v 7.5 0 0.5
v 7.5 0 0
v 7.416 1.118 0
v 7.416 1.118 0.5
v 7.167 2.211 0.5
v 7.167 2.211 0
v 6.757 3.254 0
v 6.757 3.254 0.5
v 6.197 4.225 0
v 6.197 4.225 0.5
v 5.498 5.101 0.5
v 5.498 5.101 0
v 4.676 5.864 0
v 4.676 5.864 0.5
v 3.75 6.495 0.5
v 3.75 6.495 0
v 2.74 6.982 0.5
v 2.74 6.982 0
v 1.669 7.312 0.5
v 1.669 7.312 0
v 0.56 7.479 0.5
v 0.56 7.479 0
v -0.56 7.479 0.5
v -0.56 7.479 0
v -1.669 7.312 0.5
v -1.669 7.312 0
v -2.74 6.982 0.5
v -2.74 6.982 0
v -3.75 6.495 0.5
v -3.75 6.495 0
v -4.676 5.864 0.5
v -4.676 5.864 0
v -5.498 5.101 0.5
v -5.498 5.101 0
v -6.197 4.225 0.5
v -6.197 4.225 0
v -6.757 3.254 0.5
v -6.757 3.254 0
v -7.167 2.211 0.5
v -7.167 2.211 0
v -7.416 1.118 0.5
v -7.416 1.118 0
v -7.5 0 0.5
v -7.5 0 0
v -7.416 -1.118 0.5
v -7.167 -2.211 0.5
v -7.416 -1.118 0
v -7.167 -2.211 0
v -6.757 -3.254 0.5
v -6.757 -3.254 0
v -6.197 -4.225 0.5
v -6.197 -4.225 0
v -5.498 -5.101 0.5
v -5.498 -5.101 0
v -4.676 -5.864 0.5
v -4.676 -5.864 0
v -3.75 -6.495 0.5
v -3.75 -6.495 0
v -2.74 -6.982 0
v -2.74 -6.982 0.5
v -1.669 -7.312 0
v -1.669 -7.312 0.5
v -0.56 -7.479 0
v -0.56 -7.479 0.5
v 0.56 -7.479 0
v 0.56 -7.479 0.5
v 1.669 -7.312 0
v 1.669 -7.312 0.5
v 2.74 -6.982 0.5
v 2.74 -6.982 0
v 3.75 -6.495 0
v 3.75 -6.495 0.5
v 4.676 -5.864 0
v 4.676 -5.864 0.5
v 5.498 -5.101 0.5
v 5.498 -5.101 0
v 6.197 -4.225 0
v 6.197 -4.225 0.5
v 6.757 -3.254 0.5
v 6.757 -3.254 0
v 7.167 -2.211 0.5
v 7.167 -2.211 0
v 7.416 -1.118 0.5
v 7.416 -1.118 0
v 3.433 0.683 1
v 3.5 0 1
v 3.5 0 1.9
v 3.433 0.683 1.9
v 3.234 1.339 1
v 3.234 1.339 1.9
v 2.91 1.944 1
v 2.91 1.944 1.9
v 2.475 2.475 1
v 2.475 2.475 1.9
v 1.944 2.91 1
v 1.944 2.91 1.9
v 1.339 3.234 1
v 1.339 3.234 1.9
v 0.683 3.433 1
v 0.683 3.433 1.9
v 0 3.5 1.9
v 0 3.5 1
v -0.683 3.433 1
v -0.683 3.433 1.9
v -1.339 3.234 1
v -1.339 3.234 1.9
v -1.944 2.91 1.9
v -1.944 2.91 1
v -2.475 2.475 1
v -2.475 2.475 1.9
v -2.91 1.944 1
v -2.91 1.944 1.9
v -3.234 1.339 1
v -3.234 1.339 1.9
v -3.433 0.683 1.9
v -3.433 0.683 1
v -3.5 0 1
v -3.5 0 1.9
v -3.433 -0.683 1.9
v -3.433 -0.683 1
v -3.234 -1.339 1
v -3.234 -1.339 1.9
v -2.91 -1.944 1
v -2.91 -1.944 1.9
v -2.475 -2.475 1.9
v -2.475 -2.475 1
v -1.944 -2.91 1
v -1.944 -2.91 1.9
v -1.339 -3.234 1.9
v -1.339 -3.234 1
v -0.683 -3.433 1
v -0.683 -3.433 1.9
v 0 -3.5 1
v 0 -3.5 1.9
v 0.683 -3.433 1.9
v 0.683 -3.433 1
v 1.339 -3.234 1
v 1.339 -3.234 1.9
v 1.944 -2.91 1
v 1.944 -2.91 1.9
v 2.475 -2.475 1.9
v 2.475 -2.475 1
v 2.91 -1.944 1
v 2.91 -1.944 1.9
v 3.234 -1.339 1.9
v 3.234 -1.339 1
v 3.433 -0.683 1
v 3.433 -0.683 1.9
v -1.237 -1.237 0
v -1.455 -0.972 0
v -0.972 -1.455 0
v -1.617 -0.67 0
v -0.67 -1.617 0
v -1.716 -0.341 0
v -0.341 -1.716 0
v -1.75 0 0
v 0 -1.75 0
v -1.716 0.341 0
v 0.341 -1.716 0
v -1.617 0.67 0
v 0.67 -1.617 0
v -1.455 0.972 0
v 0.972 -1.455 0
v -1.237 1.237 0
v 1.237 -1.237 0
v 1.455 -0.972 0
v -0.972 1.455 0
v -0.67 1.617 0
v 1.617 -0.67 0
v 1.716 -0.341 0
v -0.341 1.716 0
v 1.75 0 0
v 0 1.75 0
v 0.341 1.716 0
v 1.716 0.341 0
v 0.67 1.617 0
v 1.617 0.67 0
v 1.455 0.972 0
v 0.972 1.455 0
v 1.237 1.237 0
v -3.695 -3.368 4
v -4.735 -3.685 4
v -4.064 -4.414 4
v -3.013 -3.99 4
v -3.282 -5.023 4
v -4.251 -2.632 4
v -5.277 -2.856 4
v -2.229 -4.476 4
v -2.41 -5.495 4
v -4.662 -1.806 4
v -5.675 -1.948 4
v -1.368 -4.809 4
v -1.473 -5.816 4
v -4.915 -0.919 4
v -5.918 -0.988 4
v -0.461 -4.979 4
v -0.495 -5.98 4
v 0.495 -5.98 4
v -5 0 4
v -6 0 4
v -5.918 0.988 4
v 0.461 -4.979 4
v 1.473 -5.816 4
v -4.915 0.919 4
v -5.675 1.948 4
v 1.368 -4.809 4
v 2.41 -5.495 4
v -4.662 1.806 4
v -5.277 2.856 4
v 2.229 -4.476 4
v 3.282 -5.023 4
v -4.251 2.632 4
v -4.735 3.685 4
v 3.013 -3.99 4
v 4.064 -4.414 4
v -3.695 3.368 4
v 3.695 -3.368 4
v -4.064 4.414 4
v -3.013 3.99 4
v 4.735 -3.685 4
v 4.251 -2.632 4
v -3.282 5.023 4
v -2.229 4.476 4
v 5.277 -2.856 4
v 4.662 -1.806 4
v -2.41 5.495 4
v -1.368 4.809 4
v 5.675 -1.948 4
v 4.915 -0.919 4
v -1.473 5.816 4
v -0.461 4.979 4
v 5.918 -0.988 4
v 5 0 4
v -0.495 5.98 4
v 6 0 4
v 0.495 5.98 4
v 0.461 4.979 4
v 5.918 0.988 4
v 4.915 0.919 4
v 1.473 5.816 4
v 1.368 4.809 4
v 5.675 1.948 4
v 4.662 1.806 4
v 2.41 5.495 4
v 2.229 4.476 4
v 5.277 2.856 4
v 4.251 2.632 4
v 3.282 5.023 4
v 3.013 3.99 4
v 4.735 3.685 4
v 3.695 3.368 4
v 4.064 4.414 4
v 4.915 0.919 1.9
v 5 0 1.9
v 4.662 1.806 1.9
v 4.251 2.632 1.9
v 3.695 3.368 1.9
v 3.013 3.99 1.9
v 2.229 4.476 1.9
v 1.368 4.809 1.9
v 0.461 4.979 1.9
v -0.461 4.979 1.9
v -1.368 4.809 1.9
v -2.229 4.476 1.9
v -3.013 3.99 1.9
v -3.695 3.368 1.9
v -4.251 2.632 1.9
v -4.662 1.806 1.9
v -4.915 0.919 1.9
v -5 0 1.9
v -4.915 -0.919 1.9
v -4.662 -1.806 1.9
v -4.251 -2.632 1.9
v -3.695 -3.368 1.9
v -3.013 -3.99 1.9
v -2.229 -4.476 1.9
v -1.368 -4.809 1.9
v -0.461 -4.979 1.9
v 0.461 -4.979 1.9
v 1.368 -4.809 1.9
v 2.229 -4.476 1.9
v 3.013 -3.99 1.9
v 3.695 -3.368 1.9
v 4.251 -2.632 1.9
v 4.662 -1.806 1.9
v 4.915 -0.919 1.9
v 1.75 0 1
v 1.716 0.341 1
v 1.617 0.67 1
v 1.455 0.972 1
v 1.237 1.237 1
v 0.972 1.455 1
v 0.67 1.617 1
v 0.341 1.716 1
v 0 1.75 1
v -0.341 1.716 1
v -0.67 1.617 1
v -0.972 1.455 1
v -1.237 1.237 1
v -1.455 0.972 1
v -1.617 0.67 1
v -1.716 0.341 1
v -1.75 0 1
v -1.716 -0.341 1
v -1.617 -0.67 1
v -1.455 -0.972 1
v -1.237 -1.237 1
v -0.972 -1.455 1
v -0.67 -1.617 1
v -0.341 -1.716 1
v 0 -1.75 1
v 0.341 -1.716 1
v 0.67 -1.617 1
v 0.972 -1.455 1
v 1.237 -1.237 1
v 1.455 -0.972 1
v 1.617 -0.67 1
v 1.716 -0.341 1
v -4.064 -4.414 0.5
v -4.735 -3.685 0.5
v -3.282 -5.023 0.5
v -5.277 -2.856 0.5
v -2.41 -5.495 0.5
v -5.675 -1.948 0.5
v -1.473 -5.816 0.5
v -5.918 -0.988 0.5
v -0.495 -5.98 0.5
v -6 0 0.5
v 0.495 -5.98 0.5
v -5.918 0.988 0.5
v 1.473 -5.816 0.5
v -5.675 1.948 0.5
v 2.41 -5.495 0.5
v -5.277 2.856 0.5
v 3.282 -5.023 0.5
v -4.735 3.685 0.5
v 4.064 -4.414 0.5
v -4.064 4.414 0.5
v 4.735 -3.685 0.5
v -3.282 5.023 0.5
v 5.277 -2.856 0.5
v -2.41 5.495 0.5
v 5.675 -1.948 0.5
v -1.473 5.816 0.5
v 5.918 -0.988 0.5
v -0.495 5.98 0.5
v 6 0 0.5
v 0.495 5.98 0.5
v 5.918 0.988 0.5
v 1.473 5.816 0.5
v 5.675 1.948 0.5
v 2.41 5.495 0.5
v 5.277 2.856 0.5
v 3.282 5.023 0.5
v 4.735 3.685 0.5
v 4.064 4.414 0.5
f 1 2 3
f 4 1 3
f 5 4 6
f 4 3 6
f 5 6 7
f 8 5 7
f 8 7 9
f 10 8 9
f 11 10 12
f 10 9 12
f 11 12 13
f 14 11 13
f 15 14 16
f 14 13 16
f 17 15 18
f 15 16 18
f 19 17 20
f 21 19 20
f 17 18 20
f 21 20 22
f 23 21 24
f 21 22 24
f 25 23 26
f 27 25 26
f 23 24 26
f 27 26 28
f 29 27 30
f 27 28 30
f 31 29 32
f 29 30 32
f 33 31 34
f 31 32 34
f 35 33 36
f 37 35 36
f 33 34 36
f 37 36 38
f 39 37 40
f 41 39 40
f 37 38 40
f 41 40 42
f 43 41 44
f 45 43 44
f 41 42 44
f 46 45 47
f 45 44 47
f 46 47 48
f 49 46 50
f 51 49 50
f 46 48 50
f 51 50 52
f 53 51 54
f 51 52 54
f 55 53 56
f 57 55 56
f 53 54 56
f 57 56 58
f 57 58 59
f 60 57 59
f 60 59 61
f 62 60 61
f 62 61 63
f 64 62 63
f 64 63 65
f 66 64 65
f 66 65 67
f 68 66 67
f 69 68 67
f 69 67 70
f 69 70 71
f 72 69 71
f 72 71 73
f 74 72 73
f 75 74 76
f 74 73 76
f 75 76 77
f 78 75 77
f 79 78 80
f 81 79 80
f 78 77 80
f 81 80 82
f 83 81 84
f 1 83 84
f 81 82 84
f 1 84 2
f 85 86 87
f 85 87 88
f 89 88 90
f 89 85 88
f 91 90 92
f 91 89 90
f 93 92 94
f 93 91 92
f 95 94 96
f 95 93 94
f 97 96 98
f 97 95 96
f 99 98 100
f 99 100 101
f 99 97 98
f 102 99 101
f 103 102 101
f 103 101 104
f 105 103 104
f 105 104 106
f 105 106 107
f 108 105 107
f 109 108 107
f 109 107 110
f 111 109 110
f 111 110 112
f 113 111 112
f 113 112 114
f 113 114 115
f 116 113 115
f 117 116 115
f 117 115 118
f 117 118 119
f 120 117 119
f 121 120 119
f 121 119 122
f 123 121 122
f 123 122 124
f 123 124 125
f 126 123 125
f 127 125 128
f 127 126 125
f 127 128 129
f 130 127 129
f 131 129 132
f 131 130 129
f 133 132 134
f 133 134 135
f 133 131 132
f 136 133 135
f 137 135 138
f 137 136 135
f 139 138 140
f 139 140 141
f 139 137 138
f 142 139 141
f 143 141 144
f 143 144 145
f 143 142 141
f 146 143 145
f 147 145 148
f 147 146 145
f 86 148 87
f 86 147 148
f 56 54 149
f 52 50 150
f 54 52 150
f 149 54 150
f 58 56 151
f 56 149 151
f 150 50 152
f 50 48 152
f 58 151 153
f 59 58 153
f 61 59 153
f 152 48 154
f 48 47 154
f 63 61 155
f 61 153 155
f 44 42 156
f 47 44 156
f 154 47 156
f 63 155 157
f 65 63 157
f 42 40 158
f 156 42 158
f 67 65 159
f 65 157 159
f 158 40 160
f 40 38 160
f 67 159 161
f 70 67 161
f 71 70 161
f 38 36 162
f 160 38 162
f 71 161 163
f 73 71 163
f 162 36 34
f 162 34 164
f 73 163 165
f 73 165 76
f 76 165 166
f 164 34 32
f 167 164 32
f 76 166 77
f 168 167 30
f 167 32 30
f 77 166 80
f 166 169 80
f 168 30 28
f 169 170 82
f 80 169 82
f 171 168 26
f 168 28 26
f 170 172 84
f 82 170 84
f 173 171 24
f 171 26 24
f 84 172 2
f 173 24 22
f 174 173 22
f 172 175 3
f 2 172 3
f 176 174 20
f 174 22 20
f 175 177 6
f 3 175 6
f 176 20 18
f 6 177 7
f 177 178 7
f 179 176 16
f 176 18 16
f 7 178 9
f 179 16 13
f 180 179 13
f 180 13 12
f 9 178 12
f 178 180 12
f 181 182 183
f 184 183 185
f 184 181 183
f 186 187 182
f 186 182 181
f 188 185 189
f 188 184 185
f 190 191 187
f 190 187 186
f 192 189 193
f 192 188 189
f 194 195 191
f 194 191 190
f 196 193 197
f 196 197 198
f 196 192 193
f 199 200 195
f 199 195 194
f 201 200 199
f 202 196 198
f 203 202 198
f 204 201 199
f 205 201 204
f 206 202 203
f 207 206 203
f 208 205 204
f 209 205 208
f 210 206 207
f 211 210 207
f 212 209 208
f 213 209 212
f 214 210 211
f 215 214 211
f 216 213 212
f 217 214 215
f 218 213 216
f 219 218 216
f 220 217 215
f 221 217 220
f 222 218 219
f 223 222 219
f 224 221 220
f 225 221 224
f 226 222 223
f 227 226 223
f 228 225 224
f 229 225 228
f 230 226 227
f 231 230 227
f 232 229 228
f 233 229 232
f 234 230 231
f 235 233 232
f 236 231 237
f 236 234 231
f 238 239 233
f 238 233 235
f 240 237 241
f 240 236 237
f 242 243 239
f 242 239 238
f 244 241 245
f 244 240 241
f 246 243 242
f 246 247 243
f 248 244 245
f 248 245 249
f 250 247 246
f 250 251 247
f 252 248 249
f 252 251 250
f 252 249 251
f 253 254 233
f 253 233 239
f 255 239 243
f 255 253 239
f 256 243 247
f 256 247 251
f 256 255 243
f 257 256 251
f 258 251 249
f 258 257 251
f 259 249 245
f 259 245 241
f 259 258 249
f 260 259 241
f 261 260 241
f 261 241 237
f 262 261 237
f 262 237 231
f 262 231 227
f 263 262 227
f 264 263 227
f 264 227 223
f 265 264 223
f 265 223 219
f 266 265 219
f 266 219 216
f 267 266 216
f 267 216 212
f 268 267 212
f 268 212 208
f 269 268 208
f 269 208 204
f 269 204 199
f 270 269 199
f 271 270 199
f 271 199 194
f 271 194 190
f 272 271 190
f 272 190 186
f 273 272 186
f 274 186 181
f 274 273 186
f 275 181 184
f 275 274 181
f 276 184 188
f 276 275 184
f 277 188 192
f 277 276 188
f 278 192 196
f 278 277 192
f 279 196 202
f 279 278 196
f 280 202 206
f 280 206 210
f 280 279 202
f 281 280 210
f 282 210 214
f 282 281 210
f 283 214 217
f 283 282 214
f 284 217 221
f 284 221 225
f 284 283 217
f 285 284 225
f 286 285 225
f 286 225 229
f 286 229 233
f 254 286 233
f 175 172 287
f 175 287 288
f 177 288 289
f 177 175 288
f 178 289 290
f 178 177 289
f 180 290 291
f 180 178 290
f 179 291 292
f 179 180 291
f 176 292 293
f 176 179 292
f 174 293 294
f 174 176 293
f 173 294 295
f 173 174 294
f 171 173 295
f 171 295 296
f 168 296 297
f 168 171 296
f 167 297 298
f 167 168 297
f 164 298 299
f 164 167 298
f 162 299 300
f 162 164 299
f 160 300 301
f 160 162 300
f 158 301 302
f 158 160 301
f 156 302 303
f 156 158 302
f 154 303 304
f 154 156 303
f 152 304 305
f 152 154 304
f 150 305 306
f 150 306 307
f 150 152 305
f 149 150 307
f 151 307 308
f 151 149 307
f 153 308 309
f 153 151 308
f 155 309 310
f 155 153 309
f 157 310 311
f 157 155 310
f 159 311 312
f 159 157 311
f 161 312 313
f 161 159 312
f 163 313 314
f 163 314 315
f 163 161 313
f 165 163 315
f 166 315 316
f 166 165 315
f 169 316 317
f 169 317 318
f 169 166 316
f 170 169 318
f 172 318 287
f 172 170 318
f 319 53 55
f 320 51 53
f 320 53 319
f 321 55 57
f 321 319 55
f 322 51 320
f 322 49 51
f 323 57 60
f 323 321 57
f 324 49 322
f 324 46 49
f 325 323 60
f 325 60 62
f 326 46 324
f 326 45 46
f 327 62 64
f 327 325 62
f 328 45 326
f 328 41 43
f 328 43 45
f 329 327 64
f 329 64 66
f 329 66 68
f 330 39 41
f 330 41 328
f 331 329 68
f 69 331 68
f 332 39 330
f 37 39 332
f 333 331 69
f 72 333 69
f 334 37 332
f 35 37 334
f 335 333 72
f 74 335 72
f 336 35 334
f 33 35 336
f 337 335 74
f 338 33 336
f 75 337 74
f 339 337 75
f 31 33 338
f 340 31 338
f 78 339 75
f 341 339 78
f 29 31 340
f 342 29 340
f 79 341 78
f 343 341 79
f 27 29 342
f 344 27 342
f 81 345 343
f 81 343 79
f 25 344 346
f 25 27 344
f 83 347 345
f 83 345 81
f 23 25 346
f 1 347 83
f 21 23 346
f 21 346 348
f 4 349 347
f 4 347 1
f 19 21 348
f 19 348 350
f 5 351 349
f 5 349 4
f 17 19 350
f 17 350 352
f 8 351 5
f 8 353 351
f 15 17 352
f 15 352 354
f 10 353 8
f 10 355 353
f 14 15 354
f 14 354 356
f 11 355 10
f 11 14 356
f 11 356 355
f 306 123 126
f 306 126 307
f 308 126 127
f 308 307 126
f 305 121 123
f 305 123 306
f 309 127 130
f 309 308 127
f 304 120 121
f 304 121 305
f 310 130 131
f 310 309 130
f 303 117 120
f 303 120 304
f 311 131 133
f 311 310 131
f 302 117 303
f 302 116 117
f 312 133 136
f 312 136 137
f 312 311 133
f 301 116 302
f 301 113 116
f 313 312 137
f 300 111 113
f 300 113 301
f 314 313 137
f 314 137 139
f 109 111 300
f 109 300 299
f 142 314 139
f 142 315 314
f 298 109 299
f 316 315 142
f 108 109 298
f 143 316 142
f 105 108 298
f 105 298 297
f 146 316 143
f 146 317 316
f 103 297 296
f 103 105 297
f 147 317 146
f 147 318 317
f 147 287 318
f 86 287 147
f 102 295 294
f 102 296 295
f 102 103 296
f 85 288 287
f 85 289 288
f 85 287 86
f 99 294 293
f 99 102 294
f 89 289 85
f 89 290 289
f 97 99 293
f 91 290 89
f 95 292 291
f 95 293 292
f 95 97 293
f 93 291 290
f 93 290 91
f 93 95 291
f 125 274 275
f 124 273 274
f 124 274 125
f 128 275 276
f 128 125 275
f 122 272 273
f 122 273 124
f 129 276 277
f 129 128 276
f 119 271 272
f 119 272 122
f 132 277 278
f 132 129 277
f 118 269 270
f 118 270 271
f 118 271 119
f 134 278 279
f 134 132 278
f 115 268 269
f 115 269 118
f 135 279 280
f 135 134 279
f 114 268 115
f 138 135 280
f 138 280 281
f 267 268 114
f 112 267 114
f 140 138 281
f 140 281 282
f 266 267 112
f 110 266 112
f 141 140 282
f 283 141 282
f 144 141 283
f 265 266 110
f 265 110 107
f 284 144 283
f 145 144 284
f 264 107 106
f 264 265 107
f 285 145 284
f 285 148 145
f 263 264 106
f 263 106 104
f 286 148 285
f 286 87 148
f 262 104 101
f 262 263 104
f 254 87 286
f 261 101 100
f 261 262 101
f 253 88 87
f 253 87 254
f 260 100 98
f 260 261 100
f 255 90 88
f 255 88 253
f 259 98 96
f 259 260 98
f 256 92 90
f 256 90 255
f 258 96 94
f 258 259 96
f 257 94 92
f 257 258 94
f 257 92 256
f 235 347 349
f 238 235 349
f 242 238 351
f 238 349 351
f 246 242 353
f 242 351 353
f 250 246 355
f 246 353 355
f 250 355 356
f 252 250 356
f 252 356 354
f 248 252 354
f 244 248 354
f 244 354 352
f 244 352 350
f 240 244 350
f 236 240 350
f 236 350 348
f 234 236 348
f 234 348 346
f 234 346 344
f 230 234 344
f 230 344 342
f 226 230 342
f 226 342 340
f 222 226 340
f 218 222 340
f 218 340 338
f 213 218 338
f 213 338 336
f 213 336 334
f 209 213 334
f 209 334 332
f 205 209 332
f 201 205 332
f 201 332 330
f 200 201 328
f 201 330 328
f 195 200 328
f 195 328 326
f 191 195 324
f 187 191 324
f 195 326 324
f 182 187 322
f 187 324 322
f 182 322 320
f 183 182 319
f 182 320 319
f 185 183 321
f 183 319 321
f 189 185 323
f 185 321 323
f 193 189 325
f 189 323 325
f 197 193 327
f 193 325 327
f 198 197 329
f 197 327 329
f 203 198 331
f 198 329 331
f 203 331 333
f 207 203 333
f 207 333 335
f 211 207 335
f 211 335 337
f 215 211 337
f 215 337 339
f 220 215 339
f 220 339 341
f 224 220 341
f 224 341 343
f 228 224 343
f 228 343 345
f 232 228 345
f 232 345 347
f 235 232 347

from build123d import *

# Parameters (mm, degrees)
F0_R     = 6
F0_R_2   = 5
F1_DEPTH = 4
F0_R_3   = 7.5
F2_DEPTH = 0.5
F0_R_4   = 3.5
F3_DEPTH = 1.9
F0_R_5   = 1.75
F4_DEPTH = 1


with BuildPart() as f1:
    # F0 (on Top) → F1 (new body)
    with BuildSketch(Plane.XY):
        Circle(F0_R)
        Circle(F0_R_2, mode=Mode.SUBTRACT)
    extrude(amount=F1_DEPTH)

    # F0 (on Top) → F2 (join)
    with BuildSketch(Plane.XY):
        Circle(F0_R_3)
        Circle(F0_R, mode=Mode.SUBTRACT)
    extrude(amount=F2_DEPTH)

    # F0 (on Top) → F3 (join, through all)
    with BuildSketch(Plane.XY):
        Circle(F0_R_2)
        Circle(F0_R_4, mode=Mode.SUBTRACT)
    extrude(amount=F3_DEPTH)

    # F0 (on Top) → F4 (join)
    with BuildSketch(Plane.XY):
        Circle(F0_R_4)
        Circle(F0_R_5, mode=Mode.SUBTRACT)
    extrude(amount=F4_DEPTH)


solid = f1.part
